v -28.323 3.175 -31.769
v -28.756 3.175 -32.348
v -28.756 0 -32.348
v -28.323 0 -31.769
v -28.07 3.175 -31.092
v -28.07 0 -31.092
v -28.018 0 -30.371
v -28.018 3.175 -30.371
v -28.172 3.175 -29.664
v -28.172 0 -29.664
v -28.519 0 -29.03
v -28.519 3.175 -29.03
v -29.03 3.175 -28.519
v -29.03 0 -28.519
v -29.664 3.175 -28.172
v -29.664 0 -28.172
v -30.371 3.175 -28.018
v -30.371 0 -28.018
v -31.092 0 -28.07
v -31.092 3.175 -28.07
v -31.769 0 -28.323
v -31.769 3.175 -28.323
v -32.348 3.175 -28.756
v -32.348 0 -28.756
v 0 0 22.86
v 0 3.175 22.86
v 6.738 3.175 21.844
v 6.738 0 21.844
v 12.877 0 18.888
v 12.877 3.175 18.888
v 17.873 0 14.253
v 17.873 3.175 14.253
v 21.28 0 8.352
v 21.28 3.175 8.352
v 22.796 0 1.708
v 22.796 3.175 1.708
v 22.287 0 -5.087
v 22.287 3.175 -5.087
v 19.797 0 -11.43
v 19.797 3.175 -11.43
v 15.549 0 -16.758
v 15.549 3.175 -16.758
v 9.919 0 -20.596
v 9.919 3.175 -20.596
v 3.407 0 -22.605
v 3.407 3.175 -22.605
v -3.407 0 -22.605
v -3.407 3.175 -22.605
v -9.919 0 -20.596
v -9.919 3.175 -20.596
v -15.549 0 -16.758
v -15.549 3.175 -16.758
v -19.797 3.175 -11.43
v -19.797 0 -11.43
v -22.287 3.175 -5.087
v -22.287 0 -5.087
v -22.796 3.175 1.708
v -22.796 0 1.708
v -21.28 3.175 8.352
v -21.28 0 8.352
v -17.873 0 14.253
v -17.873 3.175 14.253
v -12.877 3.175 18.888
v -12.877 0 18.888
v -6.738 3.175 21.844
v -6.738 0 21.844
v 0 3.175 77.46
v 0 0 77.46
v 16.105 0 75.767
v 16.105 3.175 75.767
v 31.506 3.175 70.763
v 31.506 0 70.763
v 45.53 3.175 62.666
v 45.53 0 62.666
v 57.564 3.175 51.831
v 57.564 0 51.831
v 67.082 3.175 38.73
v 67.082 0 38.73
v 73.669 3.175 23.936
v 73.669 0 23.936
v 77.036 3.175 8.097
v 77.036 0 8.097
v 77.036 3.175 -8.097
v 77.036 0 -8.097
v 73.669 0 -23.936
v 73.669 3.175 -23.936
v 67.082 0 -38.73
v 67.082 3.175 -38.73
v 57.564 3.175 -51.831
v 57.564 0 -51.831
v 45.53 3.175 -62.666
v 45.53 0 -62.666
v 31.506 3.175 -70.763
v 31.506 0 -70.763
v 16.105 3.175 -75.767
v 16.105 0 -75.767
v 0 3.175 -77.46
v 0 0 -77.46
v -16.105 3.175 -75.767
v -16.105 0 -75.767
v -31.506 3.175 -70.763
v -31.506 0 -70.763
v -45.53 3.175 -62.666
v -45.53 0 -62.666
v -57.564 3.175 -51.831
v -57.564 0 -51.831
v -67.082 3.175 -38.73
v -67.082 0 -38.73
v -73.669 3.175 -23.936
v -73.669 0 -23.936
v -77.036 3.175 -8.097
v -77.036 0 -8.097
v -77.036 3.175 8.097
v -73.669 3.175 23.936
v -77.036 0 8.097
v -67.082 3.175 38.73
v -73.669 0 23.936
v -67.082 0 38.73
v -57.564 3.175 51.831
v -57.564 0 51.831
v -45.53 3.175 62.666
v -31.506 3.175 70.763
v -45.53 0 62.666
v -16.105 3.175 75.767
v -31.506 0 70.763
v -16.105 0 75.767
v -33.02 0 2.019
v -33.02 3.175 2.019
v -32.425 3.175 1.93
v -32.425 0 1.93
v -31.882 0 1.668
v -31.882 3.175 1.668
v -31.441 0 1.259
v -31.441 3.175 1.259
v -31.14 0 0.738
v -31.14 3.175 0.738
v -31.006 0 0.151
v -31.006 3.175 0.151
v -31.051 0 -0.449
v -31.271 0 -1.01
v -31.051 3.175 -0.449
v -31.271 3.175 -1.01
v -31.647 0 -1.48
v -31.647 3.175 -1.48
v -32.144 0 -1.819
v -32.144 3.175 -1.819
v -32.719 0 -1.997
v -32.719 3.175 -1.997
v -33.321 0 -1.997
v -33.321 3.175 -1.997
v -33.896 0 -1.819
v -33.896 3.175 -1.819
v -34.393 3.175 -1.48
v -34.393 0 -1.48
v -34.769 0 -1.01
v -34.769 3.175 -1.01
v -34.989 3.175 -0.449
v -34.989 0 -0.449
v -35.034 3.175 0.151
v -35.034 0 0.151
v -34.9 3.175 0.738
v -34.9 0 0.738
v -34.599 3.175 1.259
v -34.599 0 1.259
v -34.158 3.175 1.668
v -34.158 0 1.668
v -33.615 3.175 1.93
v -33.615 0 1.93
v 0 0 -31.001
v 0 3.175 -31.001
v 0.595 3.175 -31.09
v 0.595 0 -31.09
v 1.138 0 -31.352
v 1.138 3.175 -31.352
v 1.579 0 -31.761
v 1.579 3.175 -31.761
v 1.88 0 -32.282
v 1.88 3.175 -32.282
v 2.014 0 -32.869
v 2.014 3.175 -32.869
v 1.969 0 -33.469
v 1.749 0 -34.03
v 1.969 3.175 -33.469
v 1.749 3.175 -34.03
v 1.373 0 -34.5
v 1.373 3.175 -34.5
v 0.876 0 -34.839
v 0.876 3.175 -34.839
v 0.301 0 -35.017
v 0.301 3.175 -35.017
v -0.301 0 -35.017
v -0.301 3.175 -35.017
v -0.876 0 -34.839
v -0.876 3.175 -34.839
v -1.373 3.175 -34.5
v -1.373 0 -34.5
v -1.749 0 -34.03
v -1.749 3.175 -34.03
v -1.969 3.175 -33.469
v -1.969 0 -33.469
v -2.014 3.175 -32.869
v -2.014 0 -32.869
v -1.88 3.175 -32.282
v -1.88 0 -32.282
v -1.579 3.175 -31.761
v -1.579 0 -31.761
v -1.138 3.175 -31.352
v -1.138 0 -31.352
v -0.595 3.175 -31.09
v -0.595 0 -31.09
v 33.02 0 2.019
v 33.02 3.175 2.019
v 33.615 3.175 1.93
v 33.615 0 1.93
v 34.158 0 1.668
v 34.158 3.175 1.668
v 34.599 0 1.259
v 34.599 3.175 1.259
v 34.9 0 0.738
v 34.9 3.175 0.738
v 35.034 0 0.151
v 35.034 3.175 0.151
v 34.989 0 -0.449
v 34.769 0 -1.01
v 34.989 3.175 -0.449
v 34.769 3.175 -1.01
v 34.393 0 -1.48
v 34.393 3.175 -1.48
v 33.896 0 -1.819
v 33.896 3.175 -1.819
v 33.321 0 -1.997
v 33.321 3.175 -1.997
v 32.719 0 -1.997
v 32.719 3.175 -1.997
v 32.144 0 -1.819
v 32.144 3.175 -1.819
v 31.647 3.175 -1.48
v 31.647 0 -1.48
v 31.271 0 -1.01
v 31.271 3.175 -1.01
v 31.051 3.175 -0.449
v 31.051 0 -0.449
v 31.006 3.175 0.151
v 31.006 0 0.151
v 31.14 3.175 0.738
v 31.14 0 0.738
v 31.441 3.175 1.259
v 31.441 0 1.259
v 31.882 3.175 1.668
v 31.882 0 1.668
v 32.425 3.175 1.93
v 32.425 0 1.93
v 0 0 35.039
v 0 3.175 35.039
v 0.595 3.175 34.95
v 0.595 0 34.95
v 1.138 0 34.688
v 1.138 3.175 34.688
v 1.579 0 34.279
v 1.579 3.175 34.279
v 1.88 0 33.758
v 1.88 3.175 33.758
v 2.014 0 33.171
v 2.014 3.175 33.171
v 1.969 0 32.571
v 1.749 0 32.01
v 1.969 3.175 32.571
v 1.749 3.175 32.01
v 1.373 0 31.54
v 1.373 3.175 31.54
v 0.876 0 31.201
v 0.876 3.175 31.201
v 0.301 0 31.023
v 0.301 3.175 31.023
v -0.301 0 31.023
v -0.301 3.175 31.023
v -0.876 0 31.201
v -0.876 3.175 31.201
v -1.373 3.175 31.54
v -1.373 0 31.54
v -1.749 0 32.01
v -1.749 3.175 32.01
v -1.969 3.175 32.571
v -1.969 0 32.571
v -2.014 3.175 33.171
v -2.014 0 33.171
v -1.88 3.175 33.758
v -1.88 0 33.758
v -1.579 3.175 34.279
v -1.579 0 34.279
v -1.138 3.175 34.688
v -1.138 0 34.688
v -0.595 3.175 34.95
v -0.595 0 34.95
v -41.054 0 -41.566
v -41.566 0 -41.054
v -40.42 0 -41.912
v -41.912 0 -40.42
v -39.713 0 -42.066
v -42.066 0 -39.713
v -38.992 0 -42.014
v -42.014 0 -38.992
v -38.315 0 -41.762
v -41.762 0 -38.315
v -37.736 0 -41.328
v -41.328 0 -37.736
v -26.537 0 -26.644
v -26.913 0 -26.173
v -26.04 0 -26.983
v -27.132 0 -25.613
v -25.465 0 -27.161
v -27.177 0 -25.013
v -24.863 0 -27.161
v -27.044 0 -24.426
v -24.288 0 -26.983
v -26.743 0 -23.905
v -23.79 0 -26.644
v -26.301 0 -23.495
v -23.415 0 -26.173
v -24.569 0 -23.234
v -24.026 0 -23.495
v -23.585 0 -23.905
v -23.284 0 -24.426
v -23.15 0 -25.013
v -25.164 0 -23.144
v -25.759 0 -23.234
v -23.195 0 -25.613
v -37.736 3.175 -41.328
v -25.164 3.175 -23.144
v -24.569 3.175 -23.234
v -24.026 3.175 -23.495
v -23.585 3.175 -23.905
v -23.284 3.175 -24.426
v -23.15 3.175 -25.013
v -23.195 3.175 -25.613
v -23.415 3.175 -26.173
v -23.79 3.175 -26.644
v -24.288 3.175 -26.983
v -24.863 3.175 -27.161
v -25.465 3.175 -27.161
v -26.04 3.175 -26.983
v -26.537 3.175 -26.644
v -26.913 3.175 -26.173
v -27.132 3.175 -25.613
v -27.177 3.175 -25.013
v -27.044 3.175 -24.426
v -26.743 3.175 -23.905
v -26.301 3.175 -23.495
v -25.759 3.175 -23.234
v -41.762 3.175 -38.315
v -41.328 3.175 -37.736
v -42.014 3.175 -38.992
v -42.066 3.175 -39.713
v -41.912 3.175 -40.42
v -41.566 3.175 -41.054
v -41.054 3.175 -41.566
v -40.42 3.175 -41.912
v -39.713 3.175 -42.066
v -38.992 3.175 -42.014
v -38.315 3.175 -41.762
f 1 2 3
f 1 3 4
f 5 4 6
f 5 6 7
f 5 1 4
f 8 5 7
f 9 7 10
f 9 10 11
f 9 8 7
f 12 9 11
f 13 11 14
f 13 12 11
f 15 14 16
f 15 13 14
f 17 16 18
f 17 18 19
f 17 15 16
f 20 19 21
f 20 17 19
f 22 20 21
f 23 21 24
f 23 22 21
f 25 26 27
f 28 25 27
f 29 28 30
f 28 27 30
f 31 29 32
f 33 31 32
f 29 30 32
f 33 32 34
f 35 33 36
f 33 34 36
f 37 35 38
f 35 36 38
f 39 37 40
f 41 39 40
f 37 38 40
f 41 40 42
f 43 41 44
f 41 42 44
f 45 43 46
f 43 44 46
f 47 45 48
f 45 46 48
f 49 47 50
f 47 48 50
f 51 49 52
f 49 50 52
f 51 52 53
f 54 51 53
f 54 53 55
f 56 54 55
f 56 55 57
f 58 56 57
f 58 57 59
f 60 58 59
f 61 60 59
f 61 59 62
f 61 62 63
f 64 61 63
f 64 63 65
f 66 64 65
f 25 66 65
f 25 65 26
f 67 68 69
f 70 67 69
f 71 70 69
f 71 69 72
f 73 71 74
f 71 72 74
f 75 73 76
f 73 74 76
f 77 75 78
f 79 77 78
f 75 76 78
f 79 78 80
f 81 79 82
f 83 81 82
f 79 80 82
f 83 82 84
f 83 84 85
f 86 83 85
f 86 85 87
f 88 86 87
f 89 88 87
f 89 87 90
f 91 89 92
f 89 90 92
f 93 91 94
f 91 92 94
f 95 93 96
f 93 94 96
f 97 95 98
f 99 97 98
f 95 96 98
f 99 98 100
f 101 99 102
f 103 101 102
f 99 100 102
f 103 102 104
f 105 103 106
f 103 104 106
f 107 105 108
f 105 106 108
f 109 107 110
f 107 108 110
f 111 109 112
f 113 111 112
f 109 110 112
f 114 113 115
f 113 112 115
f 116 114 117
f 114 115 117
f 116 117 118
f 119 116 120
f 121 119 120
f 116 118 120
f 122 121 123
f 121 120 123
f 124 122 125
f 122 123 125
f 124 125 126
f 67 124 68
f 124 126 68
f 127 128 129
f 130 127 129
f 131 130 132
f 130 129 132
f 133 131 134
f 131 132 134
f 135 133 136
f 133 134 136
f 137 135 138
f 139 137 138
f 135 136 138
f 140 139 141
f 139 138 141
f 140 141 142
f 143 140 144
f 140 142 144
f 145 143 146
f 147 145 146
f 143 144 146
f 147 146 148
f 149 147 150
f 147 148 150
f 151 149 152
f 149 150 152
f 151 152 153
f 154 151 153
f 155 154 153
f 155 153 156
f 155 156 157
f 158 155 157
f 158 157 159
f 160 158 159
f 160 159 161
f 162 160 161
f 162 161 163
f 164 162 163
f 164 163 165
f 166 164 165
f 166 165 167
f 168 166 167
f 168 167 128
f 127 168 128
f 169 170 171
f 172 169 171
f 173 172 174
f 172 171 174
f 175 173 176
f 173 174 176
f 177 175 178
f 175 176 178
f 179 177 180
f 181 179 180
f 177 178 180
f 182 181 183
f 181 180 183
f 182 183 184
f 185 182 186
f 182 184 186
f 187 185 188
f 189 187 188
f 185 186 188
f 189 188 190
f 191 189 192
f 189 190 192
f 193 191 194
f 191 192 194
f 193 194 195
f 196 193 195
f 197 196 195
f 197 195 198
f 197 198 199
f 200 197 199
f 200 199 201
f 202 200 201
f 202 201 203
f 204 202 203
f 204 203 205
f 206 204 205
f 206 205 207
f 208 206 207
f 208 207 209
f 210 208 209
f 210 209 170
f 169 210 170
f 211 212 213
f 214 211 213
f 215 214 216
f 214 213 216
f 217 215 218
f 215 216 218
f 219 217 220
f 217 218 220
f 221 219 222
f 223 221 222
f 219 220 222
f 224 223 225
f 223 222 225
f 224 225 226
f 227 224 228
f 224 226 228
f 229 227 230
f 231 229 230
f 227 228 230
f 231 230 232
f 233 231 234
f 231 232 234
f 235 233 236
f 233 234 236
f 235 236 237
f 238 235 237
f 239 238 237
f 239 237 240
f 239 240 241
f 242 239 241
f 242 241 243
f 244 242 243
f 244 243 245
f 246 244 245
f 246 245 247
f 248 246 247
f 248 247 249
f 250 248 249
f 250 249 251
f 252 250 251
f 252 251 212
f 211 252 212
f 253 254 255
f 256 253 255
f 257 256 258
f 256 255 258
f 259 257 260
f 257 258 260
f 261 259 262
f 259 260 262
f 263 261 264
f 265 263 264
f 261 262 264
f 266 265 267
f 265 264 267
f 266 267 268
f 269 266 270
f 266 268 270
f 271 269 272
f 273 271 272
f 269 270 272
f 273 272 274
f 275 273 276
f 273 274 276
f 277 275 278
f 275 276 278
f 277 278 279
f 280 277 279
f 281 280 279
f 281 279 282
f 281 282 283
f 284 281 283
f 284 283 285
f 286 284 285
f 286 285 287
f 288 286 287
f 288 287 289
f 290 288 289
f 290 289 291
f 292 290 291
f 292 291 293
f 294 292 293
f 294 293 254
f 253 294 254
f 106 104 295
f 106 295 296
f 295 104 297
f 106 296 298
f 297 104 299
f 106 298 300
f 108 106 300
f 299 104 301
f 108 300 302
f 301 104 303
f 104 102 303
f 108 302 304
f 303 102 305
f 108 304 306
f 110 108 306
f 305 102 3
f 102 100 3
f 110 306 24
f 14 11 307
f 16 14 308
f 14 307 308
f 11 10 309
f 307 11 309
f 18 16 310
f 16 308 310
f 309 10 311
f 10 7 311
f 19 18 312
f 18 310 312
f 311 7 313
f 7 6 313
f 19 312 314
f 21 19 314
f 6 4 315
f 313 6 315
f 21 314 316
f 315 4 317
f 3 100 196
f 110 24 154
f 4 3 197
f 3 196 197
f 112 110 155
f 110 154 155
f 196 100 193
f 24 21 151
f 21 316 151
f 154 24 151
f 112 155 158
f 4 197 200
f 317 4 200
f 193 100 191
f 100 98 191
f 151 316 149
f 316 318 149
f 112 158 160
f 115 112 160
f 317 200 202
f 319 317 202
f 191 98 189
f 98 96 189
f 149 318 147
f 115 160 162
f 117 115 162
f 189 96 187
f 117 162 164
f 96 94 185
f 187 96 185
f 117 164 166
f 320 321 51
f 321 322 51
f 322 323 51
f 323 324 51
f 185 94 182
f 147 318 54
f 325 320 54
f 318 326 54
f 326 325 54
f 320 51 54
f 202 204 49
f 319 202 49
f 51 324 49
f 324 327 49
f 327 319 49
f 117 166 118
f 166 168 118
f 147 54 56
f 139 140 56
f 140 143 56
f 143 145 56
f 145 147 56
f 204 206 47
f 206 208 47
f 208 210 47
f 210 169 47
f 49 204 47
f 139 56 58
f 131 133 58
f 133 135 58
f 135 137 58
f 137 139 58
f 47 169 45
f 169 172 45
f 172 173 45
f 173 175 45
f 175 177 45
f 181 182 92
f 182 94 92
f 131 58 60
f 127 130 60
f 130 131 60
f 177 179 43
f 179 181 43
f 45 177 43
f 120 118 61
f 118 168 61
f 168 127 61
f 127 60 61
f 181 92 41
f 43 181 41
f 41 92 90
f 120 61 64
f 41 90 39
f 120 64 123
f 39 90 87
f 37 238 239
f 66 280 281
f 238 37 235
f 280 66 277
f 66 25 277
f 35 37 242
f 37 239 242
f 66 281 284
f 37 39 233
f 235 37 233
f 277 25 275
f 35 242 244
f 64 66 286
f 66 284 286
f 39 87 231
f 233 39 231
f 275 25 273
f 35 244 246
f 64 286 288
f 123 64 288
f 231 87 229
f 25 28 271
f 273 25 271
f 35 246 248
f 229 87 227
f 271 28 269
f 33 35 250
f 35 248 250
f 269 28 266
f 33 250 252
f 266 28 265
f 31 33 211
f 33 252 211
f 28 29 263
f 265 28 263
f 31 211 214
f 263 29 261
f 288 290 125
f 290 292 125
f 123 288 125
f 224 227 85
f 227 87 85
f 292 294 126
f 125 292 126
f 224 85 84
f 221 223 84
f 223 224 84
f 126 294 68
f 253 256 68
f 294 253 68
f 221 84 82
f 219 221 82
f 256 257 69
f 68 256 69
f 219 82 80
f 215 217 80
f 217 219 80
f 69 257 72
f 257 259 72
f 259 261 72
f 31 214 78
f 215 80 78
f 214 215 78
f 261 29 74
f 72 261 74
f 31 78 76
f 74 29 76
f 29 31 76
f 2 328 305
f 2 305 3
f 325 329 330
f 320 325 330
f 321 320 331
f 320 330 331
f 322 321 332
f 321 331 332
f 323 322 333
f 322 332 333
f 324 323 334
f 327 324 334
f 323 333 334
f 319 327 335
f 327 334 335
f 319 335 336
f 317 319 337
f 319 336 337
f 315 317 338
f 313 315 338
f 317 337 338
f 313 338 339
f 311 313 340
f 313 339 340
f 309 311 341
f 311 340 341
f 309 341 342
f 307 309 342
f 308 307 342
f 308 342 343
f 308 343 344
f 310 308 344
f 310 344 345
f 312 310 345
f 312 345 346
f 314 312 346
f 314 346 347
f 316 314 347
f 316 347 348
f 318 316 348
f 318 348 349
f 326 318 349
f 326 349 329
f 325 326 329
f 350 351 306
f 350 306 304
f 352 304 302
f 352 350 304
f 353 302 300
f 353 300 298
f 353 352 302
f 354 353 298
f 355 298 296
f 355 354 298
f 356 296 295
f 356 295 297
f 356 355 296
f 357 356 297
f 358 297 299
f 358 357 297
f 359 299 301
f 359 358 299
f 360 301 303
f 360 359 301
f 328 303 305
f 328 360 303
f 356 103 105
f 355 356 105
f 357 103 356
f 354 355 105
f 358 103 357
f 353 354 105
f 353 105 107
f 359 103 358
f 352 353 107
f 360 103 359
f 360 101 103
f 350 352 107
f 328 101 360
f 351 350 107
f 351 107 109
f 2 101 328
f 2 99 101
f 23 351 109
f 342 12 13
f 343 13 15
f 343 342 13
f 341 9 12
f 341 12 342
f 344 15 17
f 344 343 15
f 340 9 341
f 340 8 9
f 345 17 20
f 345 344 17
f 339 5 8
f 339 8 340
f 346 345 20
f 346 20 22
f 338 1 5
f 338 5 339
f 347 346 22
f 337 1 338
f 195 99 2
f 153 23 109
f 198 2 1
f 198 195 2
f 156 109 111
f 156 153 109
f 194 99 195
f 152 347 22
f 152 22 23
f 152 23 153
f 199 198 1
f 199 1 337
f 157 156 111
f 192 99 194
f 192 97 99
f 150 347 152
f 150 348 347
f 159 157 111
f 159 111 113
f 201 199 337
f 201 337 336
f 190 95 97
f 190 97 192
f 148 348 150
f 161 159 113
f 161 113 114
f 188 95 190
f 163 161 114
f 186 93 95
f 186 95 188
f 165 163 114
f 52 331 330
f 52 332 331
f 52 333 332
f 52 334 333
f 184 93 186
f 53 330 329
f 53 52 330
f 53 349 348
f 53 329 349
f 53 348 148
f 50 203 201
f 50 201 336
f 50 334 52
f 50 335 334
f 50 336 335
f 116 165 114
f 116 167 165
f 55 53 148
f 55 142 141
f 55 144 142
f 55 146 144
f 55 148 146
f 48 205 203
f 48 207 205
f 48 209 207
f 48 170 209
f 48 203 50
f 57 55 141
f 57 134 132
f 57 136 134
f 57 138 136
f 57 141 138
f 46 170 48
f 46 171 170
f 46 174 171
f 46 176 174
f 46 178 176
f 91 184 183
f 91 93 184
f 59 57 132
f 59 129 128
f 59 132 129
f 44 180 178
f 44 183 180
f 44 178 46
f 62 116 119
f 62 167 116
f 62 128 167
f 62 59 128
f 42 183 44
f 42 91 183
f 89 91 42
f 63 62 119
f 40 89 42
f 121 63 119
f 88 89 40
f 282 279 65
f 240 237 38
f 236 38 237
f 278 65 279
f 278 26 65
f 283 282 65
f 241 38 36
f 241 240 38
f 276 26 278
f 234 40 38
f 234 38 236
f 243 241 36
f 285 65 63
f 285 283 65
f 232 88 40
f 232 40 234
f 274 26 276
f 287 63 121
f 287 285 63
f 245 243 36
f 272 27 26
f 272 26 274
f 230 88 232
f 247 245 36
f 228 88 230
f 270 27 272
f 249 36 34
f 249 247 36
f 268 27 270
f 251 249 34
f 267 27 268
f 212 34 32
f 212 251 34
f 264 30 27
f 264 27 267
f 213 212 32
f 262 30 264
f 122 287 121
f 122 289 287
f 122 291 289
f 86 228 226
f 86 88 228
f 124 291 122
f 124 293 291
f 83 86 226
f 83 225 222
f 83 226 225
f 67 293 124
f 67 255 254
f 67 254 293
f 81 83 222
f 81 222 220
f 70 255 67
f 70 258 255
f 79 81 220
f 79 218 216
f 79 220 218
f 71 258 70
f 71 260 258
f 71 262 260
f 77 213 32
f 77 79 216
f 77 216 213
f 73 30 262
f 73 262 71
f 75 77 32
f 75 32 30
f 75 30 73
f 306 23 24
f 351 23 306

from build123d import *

# Parameters (mm, degrees)
SKETCH1_R           = 77.4600051
BOSS_EXTRUDE1_DEPTH = 3.175
SKETCH20_R          = 22.86
SKETCH20_R_2        = 2.0193
CUT_EXTRUDE10_DEPTH = 250.596695835
CUT_EXTRUDE11_DEPTH = 3.175
SKETCH22_R          = 2.0193
CUT_EXTRUDE12_DEPTH = 250.596695835


with BuildPart() as part:
    # Sketch1 → Boss-Extrude1 (new body)
    with BuildSketch(Plane(origin=(0, 0, 0), x_dir=(1, 0, 0), z_dir=(0, 1, 0))):
        with Locations(Location((0, 0, 0), (0, 0, 270))):
            Circle(SKETCH1_R)
    extrude(amount=BOSS_EXTRUDE1_DEPTH)

    # Sketch20 → Cut-Extrude10 (cut, through all)
    with BuildSketch(Plane(origin=(-73.768816189, 3.175, -121.080352405), x_dir=(1, 0, 0), z_dir=(0, 1, 0))):
        with Locations(Location((73.768816189, -121.080352405, 0), (0, 0, 270))):
            Circle(SKETCH20_R)
        with Locations(Location((73.768816189, -88.060352405, 0), (0, 0, 270))):
            Circle(SKETCH20_R_2)
        with Locations(Location((106.788816189, -121.080352405, 0), (0, 0, 270))):
            Circle(SKETCH20_R_2)
        with Locations(Location((73.768816189, -154.100352405, 0), (0, 0, 270))):
            Circle(SKETCH20_R_2)
        with Locations(Location((40.748816189, -121.080352405, 0), (0, 0, 270))):
            Circle(SKETCH20_R_2)
    extrude(amount=-CUT_EXTRUDE10_DEPTH, mode=Mode.SUBTRACT)

    # Sketch21 → Cut-Extrude11 (cut)
    with BuildSketch(Plane(origin=(-73.768816189, 3.175, -121.080352405), x_dir=(1, 0, 0), z_dir=(0, 1, 0))):
        with BuildLine():
            Line((41.420818538, -92.324457203), (32.440562417, -83.344201082))
            ThreePointArc((32.440562417, -83.344201082), (32.440562417, -79.752098633), (36.032664865, -79.752098633))
            Line((36.032664865, -79.752098633), (45.012920986, -88.732354754))
            ThreePointArc((45.012920986, -88.732354754), (45.012920986, -92.324457203), (41.420818538, -92.324457203))
        make_face()
    extrude(amount=-CUT_EXTRUDE11_DEPTH, mode=Mode.SUBTRACT)

    # Sketch22 → Cut-Extrude12 (cut, through all)
    with BuildSketch(Plane(origin=(-73.768816189, 3.175, -121.080352405), x_dir=(1, 0, 0), z_dir=(0, 1, 0))):
        with Locations(Location((48.605023435, -95.916559651, 0), (0, 0, 270))):
            Circle(SKETCH22_R)
    extrude(amount=-CUT_EXTRUDE12_DEPTH, mode=Mode.SUBTRACT)


solid = part.part
